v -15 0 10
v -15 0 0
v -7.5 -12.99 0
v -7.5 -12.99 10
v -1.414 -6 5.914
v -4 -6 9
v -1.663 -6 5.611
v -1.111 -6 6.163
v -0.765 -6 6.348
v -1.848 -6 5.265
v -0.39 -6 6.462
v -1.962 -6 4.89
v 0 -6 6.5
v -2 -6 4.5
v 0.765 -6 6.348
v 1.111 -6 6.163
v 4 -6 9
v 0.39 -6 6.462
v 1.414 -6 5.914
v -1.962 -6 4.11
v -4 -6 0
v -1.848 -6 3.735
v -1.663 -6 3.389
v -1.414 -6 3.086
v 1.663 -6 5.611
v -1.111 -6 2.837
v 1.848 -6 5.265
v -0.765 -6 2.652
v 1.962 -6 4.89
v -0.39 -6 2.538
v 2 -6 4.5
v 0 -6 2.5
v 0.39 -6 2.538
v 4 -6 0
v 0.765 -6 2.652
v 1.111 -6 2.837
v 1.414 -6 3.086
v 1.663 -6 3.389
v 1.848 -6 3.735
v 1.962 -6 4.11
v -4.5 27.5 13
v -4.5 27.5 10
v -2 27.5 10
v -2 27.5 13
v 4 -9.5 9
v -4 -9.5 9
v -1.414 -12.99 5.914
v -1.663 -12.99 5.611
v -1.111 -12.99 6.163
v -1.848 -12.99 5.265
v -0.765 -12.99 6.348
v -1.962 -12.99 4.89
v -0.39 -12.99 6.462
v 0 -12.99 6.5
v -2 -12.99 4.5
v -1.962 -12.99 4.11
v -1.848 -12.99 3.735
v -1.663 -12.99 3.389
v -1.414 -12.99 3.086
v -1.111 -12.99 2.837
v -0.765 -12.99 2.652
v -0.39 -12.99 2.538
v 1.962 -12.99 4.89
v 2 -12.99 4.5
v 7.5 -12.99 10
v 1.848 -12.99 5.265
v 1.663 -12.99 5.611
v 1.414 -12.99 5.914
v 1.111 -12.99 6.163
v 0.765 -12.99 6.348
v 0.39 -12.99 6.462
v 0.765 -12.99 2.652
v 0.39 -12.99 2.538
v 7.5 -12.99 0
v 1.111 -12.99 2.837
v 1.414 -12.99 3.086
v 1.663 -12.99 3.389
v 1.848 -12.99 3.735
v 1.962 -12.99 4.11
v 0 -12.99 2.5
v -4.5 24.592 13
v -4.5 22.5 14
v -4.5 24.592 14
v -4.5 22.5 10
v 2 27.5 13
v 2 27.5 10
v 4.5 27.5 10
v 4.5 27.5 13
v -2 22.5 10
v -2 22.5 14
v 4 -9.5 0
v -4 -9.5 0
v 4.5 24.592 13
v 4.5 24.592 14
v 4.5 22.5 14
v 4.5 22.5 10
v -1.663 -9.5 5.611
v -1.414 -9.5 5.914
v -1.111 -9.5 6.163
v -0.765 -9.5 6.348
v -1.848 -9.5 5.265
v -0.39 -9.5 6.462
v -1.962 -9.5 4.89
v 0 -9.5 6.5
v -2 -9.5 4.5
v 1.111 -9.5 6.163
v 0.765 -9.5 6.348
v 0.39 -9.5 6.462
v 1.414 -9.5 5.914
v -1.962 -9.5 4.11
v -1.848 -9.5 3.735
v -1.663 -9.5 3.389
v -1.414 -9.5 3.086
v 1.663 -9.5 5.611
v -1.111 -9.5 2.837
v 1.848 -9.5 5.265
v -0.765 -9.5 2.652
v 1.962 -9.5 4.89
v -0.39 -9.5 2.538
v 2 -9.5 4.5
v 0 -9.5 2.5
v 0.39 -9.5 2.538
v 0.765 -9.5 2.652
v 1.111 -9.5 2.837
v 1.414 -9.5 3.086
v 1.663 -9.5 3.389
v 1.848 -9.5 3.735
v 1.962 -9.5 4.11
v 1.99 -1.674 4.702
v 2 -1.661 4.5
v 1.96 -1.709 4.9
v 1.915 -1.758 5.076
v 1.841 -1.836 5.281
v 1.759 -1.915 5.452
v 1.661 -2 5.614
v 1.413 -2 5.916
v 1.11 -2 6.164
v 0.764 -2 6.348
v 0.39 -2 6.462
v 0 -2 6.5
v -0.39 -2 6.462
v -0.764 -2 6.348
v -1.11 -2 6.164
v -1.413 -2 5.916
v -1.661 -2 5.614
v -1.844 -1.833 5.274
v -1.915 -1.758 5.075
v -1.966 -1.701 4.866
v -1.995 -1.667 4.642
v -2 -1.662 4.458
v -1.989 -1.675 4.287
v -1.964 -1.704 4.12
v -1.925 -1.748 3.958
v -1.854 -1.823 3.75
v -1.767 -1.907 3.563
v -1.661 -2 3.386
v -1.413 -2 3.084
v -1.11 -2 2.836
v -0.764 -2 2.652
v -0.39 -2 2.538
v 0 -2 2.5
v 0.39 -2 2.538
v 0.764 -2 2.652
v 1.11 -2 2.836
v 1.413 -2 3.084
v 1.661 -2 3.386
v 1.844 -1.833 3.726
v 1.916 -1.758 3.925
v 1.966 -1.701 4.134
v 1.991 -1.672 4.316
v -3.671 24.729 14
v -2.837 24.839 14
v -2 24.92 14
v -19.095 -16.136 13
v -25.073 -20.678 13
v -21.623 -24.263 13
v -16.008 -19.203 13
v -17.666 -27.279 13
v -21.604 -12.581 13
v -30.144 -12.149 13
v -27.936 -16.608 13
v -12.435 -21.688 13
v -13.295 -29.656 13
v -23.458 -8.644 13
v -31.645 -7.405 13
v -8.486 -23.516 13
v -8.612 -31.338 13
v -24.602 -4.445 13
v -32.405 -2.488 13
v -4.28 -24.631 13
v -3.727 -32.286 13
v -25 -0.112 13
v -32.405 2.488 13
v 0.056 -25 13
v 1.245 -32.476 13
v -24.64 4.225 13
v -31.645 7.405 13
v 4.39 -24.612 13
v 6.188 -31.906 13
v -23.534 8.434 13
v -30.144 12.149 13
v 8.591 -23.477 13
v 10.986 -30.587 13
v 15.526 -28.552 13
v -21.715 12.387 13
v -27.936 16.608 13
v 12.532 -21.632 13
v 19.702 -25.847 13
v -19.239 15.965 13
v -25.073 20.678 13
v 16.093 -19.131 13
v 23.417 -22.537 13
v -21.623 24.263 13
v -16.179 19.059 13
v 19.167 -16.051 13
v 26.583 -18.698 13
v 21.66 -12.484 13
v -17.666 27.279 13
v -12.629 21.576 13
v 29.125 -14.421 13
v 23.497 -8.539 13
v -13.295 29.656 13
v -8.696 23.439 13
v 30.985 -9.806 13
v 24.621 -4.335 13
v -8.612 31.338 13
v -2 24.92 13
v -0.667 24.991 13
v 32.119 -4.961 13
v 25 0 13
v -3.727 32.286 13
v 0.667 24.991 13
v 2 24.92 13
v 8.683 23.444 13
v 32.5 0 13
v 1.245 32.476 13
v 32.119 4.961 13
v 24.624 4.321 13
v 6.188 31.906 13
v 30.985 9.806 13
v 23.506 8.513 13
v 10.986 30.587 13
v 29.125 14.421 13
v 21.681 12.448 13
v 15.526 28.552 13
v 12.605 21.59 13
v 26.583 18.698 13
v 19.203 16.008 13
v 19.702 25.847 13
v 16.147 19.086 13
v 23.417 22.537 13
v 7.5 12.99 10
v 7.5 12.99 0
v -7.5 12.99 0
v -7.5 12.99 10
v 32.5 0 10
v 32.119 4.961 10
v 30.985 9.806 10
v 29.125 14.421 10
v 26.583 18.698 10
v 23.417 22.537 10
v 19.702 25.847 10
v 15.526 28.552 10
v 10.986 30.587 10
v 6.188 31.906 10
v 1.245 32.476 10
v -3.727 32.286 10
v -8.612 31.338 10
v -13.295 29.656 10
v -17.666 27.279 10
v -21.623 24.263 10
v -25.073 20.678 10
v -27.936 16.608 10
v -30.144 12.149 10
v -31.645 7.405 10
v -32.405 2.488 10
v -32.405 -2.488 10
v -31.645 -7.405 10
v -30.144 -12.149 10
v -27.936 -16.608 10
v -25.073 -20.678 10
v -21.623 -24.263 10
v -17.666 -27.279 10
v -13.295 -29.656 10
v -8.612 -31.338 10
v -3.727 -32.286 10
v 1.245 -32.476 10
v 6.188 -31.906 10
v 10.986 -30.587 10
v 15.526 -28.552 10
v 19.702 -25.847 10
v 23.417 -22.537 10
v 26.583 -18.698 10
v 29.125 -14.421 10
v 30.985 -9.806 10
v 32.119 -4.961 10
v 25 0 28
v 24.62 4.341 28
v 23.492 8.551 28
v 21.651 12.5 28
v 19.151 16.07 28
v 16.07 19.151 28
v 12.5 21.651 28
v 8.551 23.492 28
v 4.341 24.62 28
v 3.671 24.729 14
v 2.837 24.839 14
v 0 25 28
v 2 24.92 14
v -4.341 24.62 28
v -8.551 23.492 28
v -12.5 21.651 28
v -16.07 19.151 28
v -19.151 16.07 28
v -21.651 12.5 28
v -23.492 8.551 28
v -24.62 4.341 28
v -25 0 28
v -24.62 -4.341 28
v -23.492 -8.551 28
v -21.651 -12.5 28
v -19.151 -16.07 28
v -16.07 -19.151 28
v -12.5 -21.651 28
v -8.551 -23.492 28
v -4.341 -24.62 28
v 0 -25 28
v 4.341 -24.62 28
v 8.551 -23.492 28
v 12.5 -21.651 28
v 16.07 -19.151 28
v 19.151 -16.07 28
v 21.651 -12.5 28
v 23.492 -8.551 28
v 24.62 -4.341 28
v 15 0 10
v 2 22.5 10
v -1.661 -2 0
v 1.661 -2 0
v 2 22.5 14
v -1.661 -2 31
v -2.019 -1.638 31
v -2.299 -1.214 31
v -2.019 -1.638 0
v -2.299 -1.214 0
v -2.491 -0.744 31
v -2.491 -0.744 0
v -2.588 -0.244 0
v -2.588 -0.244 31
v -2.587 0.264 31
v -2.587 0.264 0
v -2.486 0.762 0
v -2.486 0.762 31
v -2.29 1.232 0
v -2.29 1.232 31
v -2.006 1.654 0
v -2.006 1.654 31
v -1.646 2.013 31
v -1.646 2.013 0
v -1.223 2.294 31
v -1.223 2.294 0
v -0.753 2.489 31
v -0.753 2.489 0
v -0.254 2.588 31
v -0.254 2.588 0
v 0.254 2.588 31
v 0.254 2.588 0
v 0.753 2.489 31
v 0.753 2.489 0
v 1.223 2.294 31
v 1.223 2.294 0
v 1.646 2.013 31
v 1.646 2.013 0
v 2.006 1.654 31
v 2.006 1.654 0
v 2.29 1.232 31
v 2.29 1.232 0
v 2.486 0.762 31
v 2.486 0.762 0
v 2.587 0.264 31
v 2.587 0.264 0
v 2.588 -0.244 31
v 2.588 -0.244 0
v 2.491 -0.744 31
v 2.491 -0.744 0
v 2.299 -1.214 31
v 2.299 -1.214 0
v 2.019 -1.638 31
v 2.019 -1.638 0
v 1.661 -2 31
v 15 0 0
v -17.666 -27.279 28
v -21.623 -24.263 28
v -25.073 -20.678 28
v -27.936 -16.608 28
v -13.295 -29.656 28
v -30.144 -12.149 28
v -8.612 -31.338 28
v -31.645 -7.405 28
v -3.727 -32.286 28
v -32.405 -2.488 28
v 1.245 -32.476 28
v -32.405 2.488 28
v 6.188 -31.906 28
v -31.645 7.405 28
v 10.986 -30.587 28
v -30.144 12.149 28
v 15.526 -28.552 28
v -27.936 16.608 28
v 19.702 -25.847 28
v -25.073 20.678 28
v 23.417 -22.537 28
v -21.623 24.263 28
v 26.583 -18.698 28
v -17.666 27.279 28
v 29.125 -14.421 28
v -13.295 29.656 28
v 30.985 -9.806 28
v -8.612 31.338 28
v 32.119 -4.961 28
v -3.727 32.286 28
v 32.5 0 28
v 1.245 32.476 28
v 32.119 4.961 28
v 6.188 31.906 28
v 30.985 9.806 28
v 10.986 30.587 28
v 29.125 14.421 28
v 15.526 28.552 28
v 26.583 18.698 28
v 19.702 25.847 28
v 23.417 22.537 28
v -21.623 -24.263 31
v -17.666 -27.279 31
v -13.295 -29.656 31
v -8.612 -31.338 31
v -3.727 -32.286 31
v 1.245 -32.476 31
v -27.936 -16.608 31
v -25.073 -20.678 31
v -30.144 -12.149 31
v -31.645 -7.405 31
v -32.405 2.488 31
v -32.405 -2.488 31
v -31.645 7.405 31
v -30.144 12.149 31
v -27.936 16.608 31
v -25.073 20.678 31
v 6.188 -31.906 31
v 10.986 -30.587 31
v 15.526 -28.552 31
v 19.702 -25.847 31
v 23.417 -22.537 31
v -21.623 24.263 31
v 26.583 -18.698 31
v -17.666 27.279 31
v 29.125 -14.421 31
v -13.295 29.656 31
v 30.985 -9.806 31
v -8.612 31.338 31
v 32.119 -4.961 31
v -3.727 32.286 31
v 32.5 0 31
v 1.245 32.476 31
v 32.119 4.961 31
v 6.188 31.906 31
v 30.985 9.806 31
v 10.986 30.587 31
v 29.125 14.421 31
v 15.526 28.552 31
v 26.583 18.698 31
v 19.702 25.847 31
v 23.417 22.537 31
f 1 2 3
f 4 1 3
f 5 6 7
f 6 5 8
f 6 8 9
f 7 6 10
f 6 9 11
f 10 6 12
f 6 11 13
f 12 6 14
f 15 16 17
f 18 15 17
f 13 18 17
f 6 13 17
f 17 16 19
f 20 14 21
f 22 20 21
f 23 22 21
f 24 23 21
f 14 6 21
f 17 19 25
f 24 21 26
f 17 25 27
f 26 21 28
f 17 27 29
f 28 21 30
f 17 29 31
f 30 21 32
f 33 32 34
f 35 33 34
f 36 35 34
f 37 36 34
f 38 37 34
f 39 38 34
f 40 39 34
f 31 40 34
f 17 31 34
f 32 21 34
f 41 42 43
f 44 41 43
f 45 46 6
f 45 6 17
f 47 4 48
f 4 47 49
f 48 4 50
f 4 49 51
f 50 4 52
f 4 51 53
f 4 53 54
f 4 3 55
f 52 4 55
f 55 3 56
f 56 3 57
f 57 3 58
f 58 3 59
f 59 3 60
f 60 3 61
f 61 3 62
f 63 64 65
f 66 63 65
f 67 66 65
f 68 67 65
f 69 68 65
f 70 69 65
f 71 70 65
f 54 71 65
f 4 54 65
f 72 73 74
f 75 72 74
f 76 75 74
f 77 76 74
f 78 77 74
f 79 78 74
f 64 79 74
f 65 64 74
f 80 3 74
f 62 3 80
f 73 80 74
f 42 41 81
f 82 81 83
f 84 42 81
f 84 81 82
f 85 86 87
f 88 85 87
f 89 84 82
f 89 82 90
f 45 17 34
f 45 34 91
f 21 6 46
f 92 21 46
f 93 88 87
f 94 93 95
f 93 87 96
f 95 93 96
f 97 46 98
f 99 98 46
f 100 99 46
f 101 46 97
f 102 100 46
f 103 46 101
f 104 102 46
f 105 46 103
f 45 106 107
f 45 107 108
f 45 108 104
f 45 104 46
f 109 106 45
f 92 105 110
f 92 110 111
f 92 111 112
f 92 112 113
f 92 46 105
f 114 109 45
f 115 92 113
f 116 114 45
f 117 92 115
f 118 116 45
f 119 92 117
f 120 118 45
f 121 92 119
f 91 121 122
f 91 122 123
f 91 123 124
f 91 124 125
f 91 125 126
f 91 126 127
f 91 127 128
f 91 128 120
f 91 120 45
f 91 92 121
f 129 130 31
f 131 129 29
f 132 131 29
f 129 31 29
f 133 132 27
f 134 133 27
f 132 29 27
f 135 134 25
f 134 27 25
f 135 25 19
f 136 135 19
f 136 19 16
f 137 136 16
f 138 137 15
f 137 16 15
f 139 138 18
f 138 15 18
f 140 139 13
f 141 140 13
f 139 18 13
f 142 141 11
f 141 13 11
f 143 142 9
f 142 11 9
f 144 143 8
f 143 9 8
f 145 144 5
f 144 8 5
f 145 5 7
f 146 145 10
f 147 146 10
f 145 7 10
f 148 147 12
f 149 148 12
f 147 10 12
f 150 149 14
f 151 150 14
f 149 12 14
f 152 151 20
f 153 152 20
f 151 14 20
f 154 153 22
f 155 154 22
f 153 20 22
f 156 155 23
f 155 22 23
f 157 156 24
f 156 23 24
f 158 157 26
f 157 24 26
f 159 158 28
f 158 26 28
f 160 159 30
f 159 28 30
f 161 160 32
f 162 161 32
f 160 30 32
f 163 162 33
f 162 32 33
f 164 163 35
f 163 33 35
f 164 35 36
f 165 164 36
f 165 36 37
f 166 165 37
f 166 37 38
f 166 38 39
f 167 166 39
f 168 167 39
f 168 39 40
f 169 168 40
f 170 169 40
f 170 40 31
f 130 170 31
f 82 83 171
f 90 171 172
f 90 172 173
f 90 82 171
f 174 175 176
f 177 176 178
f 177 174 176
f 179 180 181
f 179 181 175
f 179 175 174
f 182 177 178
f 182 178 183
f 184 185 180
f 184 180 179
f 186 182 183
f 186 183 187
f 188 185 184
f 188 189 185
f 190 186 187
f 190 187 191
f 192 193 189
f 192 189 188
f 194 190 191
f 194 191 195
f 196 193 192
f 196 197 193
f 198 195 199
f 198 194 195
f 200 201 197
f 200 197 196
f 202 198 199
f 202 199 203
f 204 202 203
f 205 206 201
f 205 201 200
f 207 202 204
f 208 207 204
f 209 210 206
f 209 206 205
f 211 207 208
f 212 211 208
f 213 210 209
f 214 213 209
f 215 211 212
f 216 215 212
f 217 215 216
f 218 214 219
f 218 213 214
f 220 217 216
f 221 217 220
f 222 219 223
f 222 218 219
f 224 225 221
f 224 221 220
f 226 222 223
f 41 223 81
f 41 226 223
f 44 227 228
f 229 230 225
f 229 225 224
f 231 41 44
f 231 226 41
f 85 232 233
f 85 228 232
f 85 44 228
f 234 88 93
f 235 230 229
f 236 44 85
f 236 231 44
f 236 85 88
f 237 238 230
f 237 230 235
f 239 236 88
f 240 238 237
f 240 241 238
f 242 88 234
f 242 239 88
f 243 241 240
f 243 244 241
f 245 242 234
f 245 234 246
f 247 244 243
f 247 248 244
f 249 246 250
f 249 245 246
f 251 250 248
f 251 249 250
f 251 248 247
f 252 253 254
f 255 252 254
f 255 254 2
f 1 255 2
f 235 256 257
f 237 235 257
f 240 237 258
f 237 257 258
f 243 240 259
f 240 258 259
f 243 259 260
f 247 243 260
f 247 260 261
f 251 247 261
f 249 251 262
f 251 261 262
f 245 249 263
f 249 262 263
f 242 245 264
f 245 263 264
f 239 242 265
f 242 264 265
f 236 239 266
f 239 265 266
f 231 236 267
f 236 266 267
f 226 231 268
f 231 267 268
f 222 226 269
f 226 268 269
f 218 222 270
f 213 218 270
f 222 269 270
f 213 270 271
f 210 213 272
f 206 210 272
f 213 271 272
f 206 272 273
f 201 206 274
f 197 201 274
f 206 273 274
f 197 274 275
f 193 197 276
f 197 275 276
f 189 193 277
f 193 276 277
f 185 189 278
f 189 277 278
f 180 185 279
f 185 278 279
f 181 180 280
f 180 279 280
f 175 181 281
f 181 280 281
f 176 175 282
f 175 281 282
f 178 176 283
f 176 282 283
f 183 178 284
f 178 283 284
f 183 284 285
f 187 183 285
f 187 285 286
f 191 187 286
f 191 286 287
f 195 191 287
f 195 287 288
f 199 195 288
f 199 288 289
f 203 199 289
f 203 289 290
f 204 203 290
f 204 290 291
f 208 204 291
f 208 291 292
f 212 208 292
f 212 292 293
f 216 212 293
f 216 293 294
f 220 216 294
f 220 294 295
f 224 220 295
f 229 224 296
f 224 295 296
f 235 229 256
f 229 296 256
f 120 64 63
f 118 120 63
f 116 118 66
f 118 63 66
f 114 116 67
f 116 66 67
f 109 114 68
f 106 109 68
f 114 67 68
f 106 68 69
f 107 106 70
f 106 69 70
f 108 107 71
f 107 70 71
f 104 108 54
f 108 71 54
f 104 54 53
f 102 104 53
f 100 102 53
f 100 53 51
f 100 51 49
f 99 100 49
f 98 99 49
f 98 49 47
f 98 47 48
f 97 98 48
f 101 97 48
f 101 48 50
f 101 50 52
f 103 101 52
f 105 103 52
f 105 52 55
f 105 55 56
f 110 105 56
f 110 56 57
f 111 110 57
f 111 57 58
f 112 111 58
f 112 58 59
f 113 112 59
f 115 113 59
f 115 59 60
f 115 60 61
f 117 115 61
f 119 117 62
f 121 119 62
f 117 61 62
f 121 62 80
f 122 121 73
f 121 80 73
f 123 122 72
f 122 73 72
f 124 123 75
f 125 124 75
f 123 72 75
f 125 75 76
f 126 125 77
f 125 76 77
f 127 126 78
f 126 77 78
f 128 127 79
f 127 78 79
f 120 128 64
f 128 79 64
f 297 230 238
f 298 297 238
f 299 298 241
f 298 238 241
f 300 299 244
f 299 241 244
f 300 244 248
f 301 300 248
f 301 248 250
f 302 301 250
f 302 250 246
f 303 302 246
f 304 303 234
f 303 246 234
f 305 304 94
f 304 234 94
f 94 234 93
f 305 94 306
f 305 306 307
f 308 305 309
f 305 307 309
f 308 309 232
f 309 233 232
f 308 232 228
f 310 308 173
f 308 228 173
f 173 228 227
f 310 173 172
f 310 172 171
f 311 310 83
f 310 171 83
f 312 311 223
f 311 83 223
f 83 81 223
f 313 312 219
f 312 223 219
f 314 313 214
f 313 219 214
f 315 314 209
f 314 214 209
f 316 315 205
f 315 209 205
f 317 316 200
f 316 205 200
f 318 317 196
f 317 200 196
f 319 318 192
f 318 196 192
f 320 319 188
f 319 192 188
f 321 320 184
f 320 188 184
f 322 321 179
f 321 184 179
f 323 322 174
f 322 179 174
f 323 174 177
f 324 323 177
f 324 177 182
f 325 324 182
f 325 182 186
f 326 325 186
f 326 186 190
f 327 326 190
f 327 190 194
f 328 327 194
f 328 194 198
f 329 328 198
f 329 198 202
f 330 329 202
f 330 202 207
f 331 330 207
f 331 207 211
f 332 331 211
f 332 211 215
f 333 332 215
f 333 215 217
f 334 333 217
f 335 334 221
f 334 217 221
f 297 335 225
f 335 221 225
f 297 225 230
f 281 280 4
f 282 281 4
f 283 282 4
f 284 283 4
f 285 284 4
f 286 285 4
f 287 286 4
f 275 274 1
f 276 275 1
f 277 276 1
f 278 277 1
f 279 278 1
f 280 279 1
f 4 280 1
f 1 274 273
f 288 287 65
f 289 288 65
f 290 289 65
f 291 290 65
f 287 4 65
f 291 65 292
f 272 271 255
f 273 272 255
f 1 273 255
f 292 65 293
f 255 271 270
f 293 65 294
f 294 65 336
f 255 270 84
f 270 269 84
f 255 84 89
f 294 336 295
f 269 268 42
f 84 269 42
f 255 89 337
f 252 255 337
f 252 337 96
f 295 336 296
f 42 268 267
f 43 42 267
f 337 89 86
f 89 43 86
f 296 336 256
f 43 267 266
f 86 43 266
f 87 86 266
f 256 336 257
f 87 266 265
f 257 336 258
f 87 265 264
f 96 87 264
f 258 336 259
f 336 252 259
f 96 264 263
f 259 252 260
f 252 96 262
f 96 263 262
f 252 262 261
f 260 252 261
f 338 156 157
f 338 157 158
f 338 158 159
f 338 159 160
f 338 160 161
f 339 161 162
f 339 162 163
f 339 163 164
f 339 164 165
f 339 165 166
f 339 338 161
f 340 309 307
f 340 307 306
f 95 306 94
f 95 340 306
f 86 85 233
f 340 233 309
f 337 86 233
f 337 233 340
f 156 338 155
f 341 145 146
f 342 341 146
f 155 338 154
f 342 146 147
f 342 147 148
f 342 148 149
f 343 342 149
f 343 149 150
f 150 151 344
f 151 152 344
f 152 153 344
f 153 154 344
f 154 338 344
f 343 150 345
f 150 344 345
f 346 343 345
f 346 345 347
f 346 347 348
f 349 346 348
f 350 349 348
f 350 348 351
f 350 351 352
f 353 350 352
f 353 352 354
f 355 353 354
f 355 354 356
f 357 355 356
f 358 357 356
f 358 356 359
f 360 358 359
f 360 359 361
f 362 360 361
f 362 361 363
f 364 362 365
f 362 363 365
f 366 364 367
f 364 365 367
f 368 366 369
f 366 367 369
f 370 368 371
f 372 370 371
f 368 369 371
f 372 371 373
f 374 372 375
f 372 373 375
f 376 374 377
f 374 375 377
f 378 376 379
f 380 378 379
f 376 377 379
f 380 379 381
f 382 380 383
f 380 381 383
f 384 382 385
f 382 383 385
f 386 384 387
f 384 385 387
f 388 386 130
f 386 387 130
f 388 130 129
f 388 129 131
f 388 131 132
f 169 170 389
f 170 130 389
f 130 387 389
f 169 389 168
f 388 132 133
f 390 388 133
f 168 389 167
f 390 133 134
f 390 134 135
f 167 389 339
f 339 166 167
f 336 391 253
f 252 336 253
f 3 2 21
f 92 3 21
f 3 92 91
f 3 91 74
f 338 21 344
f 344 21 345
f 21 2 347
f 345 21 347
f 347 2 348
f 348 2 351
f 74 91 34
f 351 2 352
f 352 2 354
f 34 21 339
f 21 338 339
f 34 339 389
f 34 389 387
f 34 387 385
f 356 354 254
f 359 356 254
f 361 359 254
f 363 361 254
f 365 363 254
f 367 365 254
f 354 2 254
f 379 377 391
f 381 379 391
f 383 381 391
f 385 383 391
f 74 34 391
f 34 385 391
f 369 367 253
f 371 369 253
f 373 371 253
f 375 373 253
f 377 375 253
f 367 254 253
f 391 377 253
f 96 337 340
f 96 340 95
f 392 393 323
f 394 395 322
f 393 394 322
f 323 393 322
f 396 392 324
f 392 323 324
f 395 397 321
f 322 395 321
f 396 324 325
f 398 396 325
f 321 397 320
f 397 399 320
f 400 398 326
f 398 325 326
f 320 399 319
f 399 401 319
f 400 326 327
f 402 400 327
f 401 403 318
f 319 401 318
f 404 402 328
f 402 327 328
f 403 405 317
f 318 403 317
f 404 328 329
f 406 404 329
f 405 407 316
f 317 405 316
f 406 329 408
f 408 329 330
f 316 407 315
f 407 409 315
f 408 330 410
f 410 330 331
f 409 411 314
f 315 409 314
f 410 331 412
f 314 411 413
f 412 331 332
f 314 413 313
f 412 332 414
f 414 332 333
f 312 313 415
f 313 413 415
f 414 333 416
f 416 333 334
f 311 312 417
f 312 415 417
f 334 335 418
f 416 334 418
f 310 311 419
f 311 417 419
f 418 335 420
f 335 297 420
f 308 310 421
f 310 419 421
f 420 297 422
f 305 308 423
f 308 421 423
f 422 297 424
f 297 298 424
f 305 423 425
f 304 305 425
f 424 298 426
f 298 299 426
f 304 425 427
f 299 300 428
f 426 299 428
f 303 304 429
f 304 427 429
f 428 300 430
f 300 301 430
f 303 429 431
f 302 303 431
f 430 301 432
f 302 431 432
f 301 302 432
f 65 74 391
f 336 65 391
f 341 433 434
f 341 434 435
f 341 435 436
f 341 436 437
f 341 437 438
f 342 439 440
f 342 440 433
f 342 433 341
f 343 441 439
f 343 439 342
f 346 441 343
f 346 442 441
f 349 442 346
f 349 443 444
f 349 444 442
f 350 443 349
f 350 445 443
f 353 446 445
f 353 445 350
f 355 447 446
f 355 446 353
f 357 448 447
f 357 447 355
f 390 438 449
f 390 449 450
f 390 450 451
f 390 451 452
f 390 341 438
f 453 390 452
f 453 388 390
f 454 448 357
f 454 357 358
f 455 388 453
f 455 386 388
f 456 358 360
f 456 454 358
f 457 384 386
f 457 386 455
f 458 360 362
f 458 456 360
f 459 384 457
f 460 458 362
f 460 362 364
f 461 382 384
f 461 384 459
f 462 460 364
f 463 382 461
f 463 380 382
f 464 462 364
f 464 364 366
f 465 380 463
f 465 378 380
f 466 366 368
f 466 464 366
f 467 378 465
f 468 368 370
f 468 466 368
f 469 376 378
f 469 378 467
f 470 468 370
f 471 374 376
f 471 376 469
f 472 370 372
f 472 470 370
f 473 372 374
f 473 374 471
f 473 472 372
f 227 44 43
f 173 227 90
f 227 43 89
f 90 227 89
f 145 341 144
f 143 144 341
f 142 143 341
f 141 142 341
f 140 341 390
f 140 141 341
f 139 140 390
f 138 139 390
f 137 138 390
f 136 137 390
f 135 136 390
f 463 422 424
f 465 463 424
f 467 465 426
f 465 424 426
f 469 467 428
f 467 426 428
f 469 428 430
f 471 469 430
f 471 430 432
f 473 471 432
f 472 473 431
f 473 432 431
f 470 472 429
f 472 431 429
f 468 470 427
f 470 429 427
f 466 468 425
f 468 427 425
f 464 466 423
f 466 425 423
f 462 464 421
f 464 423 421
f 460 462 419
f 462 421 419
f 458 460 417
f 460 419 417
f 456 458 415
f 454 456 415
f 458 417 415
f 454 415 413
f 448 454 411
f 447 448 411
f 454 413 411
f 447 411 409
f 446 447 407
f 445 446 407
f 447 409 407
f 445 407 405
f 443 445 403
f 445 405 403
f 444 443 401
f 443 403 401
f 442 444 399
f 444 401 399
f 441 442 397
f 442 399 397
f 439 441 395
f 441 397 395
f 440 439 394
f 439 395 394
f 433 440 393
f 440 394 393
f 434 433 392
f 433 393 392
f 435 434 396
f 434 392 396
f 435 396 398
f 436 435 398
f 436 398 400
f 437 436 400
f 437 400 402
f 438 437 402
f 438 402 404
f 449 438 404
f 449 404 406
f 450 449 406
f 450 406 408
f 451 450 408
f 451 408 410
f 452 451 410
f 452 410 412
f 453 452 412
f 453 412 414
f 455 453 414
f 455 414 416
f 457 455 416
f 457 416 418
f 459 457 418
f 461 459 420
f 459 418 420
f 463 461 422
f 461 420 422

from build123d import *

# Parameters (mm, degrees)
SKETCH001_R     = 32.5
PAD001_DEPTH    = 3
SKETCH002_R     = 25
PAD002_DEPTH    = 15
SKETCH003_R     = 32.5
PAD003_DEPTH    = 3
PAD_DEPTH       = 10
POCKET_DEPTH    = 31
SKETCH005_W     = 8
SKETCH005_H     = 3.5
POCKET001_DEPTH = 9
SKETCH006_R     = 2
POCKET002_DEPTH = 7
SKETCH007_W     = 2.5
SKETCH007_H     = 5
POCKET003_DEPTH = 5
POCKET004_DEPTH = 13


with BuildPart() as carretel:
    # Sketch001 → Pad001 (new body)
    with BuildSketch(Plane.XY):
        Circle(SKETCH001_R)
    extrude(amount=PAD001_DEPTH)

    # Sketch002 (on Sketch) → Pad002 (join)
    with BuildSketch(Plane.XY.offset(3)):
        Circle(SKETCH002_R)
    extrude(amount=PAD002_DEPTH)

    # Sketch003 (on Face5 of Pad002) → Pad003 (join)
    with BuildSketch(Plane.XY.offset(18)):
        Circle(SKETCH003_R)
    extrude(amount=PAD003_DEPTH)


with BuildPart() as carretel_1:
    # Body placement: moved
    add(carretel.part.moved(Location((0, 0, 10))))


with BuildPart() as base:
    # Sketch → Pad (new body)
    with BuildSketch(Plane.XY):
        Polygon((15, 0), (7.5, 12.990381), (-7.5, 12.990381), (-15, 0), (-7.5, -12.990381), (7.5, -12.990381), align=None)
    extrude(amount=PAD_DEPTH)

    # Boolean: union carretel
    add(carretel_1.part)

    # Sketch004 (on Sketch) → Pocket (cut)
    with BuildSketch(Plane(origin=(0, 0, 0), x_dir=(1, 0, 0), z_dir=(0, 0, -1))):
        with BuildLine():
            ThreePointArc((-1.661325, 2), (0, -2.6), (1.661325, 2))
            Line((-1.661325, 2), (1.661325, 2))
        make_face()
    extrude(amount=-POCKET_DEPTH, mode=Mode.SUBTRACT)

    # Sketch005 (on Face8 of Pocket) → Pocket001 (cut)
    with BuildSketch(Plane(origin=(0, 0, 0), x_dir=(1, 0, 0), z_dir=(0, 0, -1))):
        with Locations((0, 7.75)):
            Rectangle(SKETCH005_W, SKETCH005_H)
    extrude(amount=-POCKET001_DEPTH, mode=Mode.SUBTRACT)

    # Sketch006 (on Face13 of Pocket001) → Pocket002 (cut)
    with BuildSketch(Plane.XZ.offset(12.990381)):
        with Locations((0, 4.5)):
            Circle(SKETCH006_R)
    extrude(amount=-POCKET002_DEPTH, mode=Mode.SUBTRACT)

    # Sketch007 (on Face22 of Pocket002) → Pocket003 (cut)
    with BuildSketch(Plane(origin=(0, 0, 9), x_dir=(1, 0, 0), z_dir=(0, 0, -1))):
        with Locations((3.25, -25)):
            Rectangle(SKETCH007_W, SKETCH007_H)
        with Locations((-3.25, -25)):
            Rectangle(SKETCH007_W, SKETCH007_H)
    extrude(amount=-POCKET003_DEPTH, mode=Mode.SUBTRACT)

    # Sketch006 (on Face13 of Pocket001) → Pocket004 (cut)
    with BuildSketch(Plane.XZ.offset(12.990381)):
        with Locations((0, 4.5)):
            Circle(SKETCH006_R)
    extrude(amount=-POCKET004_DEPTH, mode=Mode.SUBTRACT)


solid = base.part
